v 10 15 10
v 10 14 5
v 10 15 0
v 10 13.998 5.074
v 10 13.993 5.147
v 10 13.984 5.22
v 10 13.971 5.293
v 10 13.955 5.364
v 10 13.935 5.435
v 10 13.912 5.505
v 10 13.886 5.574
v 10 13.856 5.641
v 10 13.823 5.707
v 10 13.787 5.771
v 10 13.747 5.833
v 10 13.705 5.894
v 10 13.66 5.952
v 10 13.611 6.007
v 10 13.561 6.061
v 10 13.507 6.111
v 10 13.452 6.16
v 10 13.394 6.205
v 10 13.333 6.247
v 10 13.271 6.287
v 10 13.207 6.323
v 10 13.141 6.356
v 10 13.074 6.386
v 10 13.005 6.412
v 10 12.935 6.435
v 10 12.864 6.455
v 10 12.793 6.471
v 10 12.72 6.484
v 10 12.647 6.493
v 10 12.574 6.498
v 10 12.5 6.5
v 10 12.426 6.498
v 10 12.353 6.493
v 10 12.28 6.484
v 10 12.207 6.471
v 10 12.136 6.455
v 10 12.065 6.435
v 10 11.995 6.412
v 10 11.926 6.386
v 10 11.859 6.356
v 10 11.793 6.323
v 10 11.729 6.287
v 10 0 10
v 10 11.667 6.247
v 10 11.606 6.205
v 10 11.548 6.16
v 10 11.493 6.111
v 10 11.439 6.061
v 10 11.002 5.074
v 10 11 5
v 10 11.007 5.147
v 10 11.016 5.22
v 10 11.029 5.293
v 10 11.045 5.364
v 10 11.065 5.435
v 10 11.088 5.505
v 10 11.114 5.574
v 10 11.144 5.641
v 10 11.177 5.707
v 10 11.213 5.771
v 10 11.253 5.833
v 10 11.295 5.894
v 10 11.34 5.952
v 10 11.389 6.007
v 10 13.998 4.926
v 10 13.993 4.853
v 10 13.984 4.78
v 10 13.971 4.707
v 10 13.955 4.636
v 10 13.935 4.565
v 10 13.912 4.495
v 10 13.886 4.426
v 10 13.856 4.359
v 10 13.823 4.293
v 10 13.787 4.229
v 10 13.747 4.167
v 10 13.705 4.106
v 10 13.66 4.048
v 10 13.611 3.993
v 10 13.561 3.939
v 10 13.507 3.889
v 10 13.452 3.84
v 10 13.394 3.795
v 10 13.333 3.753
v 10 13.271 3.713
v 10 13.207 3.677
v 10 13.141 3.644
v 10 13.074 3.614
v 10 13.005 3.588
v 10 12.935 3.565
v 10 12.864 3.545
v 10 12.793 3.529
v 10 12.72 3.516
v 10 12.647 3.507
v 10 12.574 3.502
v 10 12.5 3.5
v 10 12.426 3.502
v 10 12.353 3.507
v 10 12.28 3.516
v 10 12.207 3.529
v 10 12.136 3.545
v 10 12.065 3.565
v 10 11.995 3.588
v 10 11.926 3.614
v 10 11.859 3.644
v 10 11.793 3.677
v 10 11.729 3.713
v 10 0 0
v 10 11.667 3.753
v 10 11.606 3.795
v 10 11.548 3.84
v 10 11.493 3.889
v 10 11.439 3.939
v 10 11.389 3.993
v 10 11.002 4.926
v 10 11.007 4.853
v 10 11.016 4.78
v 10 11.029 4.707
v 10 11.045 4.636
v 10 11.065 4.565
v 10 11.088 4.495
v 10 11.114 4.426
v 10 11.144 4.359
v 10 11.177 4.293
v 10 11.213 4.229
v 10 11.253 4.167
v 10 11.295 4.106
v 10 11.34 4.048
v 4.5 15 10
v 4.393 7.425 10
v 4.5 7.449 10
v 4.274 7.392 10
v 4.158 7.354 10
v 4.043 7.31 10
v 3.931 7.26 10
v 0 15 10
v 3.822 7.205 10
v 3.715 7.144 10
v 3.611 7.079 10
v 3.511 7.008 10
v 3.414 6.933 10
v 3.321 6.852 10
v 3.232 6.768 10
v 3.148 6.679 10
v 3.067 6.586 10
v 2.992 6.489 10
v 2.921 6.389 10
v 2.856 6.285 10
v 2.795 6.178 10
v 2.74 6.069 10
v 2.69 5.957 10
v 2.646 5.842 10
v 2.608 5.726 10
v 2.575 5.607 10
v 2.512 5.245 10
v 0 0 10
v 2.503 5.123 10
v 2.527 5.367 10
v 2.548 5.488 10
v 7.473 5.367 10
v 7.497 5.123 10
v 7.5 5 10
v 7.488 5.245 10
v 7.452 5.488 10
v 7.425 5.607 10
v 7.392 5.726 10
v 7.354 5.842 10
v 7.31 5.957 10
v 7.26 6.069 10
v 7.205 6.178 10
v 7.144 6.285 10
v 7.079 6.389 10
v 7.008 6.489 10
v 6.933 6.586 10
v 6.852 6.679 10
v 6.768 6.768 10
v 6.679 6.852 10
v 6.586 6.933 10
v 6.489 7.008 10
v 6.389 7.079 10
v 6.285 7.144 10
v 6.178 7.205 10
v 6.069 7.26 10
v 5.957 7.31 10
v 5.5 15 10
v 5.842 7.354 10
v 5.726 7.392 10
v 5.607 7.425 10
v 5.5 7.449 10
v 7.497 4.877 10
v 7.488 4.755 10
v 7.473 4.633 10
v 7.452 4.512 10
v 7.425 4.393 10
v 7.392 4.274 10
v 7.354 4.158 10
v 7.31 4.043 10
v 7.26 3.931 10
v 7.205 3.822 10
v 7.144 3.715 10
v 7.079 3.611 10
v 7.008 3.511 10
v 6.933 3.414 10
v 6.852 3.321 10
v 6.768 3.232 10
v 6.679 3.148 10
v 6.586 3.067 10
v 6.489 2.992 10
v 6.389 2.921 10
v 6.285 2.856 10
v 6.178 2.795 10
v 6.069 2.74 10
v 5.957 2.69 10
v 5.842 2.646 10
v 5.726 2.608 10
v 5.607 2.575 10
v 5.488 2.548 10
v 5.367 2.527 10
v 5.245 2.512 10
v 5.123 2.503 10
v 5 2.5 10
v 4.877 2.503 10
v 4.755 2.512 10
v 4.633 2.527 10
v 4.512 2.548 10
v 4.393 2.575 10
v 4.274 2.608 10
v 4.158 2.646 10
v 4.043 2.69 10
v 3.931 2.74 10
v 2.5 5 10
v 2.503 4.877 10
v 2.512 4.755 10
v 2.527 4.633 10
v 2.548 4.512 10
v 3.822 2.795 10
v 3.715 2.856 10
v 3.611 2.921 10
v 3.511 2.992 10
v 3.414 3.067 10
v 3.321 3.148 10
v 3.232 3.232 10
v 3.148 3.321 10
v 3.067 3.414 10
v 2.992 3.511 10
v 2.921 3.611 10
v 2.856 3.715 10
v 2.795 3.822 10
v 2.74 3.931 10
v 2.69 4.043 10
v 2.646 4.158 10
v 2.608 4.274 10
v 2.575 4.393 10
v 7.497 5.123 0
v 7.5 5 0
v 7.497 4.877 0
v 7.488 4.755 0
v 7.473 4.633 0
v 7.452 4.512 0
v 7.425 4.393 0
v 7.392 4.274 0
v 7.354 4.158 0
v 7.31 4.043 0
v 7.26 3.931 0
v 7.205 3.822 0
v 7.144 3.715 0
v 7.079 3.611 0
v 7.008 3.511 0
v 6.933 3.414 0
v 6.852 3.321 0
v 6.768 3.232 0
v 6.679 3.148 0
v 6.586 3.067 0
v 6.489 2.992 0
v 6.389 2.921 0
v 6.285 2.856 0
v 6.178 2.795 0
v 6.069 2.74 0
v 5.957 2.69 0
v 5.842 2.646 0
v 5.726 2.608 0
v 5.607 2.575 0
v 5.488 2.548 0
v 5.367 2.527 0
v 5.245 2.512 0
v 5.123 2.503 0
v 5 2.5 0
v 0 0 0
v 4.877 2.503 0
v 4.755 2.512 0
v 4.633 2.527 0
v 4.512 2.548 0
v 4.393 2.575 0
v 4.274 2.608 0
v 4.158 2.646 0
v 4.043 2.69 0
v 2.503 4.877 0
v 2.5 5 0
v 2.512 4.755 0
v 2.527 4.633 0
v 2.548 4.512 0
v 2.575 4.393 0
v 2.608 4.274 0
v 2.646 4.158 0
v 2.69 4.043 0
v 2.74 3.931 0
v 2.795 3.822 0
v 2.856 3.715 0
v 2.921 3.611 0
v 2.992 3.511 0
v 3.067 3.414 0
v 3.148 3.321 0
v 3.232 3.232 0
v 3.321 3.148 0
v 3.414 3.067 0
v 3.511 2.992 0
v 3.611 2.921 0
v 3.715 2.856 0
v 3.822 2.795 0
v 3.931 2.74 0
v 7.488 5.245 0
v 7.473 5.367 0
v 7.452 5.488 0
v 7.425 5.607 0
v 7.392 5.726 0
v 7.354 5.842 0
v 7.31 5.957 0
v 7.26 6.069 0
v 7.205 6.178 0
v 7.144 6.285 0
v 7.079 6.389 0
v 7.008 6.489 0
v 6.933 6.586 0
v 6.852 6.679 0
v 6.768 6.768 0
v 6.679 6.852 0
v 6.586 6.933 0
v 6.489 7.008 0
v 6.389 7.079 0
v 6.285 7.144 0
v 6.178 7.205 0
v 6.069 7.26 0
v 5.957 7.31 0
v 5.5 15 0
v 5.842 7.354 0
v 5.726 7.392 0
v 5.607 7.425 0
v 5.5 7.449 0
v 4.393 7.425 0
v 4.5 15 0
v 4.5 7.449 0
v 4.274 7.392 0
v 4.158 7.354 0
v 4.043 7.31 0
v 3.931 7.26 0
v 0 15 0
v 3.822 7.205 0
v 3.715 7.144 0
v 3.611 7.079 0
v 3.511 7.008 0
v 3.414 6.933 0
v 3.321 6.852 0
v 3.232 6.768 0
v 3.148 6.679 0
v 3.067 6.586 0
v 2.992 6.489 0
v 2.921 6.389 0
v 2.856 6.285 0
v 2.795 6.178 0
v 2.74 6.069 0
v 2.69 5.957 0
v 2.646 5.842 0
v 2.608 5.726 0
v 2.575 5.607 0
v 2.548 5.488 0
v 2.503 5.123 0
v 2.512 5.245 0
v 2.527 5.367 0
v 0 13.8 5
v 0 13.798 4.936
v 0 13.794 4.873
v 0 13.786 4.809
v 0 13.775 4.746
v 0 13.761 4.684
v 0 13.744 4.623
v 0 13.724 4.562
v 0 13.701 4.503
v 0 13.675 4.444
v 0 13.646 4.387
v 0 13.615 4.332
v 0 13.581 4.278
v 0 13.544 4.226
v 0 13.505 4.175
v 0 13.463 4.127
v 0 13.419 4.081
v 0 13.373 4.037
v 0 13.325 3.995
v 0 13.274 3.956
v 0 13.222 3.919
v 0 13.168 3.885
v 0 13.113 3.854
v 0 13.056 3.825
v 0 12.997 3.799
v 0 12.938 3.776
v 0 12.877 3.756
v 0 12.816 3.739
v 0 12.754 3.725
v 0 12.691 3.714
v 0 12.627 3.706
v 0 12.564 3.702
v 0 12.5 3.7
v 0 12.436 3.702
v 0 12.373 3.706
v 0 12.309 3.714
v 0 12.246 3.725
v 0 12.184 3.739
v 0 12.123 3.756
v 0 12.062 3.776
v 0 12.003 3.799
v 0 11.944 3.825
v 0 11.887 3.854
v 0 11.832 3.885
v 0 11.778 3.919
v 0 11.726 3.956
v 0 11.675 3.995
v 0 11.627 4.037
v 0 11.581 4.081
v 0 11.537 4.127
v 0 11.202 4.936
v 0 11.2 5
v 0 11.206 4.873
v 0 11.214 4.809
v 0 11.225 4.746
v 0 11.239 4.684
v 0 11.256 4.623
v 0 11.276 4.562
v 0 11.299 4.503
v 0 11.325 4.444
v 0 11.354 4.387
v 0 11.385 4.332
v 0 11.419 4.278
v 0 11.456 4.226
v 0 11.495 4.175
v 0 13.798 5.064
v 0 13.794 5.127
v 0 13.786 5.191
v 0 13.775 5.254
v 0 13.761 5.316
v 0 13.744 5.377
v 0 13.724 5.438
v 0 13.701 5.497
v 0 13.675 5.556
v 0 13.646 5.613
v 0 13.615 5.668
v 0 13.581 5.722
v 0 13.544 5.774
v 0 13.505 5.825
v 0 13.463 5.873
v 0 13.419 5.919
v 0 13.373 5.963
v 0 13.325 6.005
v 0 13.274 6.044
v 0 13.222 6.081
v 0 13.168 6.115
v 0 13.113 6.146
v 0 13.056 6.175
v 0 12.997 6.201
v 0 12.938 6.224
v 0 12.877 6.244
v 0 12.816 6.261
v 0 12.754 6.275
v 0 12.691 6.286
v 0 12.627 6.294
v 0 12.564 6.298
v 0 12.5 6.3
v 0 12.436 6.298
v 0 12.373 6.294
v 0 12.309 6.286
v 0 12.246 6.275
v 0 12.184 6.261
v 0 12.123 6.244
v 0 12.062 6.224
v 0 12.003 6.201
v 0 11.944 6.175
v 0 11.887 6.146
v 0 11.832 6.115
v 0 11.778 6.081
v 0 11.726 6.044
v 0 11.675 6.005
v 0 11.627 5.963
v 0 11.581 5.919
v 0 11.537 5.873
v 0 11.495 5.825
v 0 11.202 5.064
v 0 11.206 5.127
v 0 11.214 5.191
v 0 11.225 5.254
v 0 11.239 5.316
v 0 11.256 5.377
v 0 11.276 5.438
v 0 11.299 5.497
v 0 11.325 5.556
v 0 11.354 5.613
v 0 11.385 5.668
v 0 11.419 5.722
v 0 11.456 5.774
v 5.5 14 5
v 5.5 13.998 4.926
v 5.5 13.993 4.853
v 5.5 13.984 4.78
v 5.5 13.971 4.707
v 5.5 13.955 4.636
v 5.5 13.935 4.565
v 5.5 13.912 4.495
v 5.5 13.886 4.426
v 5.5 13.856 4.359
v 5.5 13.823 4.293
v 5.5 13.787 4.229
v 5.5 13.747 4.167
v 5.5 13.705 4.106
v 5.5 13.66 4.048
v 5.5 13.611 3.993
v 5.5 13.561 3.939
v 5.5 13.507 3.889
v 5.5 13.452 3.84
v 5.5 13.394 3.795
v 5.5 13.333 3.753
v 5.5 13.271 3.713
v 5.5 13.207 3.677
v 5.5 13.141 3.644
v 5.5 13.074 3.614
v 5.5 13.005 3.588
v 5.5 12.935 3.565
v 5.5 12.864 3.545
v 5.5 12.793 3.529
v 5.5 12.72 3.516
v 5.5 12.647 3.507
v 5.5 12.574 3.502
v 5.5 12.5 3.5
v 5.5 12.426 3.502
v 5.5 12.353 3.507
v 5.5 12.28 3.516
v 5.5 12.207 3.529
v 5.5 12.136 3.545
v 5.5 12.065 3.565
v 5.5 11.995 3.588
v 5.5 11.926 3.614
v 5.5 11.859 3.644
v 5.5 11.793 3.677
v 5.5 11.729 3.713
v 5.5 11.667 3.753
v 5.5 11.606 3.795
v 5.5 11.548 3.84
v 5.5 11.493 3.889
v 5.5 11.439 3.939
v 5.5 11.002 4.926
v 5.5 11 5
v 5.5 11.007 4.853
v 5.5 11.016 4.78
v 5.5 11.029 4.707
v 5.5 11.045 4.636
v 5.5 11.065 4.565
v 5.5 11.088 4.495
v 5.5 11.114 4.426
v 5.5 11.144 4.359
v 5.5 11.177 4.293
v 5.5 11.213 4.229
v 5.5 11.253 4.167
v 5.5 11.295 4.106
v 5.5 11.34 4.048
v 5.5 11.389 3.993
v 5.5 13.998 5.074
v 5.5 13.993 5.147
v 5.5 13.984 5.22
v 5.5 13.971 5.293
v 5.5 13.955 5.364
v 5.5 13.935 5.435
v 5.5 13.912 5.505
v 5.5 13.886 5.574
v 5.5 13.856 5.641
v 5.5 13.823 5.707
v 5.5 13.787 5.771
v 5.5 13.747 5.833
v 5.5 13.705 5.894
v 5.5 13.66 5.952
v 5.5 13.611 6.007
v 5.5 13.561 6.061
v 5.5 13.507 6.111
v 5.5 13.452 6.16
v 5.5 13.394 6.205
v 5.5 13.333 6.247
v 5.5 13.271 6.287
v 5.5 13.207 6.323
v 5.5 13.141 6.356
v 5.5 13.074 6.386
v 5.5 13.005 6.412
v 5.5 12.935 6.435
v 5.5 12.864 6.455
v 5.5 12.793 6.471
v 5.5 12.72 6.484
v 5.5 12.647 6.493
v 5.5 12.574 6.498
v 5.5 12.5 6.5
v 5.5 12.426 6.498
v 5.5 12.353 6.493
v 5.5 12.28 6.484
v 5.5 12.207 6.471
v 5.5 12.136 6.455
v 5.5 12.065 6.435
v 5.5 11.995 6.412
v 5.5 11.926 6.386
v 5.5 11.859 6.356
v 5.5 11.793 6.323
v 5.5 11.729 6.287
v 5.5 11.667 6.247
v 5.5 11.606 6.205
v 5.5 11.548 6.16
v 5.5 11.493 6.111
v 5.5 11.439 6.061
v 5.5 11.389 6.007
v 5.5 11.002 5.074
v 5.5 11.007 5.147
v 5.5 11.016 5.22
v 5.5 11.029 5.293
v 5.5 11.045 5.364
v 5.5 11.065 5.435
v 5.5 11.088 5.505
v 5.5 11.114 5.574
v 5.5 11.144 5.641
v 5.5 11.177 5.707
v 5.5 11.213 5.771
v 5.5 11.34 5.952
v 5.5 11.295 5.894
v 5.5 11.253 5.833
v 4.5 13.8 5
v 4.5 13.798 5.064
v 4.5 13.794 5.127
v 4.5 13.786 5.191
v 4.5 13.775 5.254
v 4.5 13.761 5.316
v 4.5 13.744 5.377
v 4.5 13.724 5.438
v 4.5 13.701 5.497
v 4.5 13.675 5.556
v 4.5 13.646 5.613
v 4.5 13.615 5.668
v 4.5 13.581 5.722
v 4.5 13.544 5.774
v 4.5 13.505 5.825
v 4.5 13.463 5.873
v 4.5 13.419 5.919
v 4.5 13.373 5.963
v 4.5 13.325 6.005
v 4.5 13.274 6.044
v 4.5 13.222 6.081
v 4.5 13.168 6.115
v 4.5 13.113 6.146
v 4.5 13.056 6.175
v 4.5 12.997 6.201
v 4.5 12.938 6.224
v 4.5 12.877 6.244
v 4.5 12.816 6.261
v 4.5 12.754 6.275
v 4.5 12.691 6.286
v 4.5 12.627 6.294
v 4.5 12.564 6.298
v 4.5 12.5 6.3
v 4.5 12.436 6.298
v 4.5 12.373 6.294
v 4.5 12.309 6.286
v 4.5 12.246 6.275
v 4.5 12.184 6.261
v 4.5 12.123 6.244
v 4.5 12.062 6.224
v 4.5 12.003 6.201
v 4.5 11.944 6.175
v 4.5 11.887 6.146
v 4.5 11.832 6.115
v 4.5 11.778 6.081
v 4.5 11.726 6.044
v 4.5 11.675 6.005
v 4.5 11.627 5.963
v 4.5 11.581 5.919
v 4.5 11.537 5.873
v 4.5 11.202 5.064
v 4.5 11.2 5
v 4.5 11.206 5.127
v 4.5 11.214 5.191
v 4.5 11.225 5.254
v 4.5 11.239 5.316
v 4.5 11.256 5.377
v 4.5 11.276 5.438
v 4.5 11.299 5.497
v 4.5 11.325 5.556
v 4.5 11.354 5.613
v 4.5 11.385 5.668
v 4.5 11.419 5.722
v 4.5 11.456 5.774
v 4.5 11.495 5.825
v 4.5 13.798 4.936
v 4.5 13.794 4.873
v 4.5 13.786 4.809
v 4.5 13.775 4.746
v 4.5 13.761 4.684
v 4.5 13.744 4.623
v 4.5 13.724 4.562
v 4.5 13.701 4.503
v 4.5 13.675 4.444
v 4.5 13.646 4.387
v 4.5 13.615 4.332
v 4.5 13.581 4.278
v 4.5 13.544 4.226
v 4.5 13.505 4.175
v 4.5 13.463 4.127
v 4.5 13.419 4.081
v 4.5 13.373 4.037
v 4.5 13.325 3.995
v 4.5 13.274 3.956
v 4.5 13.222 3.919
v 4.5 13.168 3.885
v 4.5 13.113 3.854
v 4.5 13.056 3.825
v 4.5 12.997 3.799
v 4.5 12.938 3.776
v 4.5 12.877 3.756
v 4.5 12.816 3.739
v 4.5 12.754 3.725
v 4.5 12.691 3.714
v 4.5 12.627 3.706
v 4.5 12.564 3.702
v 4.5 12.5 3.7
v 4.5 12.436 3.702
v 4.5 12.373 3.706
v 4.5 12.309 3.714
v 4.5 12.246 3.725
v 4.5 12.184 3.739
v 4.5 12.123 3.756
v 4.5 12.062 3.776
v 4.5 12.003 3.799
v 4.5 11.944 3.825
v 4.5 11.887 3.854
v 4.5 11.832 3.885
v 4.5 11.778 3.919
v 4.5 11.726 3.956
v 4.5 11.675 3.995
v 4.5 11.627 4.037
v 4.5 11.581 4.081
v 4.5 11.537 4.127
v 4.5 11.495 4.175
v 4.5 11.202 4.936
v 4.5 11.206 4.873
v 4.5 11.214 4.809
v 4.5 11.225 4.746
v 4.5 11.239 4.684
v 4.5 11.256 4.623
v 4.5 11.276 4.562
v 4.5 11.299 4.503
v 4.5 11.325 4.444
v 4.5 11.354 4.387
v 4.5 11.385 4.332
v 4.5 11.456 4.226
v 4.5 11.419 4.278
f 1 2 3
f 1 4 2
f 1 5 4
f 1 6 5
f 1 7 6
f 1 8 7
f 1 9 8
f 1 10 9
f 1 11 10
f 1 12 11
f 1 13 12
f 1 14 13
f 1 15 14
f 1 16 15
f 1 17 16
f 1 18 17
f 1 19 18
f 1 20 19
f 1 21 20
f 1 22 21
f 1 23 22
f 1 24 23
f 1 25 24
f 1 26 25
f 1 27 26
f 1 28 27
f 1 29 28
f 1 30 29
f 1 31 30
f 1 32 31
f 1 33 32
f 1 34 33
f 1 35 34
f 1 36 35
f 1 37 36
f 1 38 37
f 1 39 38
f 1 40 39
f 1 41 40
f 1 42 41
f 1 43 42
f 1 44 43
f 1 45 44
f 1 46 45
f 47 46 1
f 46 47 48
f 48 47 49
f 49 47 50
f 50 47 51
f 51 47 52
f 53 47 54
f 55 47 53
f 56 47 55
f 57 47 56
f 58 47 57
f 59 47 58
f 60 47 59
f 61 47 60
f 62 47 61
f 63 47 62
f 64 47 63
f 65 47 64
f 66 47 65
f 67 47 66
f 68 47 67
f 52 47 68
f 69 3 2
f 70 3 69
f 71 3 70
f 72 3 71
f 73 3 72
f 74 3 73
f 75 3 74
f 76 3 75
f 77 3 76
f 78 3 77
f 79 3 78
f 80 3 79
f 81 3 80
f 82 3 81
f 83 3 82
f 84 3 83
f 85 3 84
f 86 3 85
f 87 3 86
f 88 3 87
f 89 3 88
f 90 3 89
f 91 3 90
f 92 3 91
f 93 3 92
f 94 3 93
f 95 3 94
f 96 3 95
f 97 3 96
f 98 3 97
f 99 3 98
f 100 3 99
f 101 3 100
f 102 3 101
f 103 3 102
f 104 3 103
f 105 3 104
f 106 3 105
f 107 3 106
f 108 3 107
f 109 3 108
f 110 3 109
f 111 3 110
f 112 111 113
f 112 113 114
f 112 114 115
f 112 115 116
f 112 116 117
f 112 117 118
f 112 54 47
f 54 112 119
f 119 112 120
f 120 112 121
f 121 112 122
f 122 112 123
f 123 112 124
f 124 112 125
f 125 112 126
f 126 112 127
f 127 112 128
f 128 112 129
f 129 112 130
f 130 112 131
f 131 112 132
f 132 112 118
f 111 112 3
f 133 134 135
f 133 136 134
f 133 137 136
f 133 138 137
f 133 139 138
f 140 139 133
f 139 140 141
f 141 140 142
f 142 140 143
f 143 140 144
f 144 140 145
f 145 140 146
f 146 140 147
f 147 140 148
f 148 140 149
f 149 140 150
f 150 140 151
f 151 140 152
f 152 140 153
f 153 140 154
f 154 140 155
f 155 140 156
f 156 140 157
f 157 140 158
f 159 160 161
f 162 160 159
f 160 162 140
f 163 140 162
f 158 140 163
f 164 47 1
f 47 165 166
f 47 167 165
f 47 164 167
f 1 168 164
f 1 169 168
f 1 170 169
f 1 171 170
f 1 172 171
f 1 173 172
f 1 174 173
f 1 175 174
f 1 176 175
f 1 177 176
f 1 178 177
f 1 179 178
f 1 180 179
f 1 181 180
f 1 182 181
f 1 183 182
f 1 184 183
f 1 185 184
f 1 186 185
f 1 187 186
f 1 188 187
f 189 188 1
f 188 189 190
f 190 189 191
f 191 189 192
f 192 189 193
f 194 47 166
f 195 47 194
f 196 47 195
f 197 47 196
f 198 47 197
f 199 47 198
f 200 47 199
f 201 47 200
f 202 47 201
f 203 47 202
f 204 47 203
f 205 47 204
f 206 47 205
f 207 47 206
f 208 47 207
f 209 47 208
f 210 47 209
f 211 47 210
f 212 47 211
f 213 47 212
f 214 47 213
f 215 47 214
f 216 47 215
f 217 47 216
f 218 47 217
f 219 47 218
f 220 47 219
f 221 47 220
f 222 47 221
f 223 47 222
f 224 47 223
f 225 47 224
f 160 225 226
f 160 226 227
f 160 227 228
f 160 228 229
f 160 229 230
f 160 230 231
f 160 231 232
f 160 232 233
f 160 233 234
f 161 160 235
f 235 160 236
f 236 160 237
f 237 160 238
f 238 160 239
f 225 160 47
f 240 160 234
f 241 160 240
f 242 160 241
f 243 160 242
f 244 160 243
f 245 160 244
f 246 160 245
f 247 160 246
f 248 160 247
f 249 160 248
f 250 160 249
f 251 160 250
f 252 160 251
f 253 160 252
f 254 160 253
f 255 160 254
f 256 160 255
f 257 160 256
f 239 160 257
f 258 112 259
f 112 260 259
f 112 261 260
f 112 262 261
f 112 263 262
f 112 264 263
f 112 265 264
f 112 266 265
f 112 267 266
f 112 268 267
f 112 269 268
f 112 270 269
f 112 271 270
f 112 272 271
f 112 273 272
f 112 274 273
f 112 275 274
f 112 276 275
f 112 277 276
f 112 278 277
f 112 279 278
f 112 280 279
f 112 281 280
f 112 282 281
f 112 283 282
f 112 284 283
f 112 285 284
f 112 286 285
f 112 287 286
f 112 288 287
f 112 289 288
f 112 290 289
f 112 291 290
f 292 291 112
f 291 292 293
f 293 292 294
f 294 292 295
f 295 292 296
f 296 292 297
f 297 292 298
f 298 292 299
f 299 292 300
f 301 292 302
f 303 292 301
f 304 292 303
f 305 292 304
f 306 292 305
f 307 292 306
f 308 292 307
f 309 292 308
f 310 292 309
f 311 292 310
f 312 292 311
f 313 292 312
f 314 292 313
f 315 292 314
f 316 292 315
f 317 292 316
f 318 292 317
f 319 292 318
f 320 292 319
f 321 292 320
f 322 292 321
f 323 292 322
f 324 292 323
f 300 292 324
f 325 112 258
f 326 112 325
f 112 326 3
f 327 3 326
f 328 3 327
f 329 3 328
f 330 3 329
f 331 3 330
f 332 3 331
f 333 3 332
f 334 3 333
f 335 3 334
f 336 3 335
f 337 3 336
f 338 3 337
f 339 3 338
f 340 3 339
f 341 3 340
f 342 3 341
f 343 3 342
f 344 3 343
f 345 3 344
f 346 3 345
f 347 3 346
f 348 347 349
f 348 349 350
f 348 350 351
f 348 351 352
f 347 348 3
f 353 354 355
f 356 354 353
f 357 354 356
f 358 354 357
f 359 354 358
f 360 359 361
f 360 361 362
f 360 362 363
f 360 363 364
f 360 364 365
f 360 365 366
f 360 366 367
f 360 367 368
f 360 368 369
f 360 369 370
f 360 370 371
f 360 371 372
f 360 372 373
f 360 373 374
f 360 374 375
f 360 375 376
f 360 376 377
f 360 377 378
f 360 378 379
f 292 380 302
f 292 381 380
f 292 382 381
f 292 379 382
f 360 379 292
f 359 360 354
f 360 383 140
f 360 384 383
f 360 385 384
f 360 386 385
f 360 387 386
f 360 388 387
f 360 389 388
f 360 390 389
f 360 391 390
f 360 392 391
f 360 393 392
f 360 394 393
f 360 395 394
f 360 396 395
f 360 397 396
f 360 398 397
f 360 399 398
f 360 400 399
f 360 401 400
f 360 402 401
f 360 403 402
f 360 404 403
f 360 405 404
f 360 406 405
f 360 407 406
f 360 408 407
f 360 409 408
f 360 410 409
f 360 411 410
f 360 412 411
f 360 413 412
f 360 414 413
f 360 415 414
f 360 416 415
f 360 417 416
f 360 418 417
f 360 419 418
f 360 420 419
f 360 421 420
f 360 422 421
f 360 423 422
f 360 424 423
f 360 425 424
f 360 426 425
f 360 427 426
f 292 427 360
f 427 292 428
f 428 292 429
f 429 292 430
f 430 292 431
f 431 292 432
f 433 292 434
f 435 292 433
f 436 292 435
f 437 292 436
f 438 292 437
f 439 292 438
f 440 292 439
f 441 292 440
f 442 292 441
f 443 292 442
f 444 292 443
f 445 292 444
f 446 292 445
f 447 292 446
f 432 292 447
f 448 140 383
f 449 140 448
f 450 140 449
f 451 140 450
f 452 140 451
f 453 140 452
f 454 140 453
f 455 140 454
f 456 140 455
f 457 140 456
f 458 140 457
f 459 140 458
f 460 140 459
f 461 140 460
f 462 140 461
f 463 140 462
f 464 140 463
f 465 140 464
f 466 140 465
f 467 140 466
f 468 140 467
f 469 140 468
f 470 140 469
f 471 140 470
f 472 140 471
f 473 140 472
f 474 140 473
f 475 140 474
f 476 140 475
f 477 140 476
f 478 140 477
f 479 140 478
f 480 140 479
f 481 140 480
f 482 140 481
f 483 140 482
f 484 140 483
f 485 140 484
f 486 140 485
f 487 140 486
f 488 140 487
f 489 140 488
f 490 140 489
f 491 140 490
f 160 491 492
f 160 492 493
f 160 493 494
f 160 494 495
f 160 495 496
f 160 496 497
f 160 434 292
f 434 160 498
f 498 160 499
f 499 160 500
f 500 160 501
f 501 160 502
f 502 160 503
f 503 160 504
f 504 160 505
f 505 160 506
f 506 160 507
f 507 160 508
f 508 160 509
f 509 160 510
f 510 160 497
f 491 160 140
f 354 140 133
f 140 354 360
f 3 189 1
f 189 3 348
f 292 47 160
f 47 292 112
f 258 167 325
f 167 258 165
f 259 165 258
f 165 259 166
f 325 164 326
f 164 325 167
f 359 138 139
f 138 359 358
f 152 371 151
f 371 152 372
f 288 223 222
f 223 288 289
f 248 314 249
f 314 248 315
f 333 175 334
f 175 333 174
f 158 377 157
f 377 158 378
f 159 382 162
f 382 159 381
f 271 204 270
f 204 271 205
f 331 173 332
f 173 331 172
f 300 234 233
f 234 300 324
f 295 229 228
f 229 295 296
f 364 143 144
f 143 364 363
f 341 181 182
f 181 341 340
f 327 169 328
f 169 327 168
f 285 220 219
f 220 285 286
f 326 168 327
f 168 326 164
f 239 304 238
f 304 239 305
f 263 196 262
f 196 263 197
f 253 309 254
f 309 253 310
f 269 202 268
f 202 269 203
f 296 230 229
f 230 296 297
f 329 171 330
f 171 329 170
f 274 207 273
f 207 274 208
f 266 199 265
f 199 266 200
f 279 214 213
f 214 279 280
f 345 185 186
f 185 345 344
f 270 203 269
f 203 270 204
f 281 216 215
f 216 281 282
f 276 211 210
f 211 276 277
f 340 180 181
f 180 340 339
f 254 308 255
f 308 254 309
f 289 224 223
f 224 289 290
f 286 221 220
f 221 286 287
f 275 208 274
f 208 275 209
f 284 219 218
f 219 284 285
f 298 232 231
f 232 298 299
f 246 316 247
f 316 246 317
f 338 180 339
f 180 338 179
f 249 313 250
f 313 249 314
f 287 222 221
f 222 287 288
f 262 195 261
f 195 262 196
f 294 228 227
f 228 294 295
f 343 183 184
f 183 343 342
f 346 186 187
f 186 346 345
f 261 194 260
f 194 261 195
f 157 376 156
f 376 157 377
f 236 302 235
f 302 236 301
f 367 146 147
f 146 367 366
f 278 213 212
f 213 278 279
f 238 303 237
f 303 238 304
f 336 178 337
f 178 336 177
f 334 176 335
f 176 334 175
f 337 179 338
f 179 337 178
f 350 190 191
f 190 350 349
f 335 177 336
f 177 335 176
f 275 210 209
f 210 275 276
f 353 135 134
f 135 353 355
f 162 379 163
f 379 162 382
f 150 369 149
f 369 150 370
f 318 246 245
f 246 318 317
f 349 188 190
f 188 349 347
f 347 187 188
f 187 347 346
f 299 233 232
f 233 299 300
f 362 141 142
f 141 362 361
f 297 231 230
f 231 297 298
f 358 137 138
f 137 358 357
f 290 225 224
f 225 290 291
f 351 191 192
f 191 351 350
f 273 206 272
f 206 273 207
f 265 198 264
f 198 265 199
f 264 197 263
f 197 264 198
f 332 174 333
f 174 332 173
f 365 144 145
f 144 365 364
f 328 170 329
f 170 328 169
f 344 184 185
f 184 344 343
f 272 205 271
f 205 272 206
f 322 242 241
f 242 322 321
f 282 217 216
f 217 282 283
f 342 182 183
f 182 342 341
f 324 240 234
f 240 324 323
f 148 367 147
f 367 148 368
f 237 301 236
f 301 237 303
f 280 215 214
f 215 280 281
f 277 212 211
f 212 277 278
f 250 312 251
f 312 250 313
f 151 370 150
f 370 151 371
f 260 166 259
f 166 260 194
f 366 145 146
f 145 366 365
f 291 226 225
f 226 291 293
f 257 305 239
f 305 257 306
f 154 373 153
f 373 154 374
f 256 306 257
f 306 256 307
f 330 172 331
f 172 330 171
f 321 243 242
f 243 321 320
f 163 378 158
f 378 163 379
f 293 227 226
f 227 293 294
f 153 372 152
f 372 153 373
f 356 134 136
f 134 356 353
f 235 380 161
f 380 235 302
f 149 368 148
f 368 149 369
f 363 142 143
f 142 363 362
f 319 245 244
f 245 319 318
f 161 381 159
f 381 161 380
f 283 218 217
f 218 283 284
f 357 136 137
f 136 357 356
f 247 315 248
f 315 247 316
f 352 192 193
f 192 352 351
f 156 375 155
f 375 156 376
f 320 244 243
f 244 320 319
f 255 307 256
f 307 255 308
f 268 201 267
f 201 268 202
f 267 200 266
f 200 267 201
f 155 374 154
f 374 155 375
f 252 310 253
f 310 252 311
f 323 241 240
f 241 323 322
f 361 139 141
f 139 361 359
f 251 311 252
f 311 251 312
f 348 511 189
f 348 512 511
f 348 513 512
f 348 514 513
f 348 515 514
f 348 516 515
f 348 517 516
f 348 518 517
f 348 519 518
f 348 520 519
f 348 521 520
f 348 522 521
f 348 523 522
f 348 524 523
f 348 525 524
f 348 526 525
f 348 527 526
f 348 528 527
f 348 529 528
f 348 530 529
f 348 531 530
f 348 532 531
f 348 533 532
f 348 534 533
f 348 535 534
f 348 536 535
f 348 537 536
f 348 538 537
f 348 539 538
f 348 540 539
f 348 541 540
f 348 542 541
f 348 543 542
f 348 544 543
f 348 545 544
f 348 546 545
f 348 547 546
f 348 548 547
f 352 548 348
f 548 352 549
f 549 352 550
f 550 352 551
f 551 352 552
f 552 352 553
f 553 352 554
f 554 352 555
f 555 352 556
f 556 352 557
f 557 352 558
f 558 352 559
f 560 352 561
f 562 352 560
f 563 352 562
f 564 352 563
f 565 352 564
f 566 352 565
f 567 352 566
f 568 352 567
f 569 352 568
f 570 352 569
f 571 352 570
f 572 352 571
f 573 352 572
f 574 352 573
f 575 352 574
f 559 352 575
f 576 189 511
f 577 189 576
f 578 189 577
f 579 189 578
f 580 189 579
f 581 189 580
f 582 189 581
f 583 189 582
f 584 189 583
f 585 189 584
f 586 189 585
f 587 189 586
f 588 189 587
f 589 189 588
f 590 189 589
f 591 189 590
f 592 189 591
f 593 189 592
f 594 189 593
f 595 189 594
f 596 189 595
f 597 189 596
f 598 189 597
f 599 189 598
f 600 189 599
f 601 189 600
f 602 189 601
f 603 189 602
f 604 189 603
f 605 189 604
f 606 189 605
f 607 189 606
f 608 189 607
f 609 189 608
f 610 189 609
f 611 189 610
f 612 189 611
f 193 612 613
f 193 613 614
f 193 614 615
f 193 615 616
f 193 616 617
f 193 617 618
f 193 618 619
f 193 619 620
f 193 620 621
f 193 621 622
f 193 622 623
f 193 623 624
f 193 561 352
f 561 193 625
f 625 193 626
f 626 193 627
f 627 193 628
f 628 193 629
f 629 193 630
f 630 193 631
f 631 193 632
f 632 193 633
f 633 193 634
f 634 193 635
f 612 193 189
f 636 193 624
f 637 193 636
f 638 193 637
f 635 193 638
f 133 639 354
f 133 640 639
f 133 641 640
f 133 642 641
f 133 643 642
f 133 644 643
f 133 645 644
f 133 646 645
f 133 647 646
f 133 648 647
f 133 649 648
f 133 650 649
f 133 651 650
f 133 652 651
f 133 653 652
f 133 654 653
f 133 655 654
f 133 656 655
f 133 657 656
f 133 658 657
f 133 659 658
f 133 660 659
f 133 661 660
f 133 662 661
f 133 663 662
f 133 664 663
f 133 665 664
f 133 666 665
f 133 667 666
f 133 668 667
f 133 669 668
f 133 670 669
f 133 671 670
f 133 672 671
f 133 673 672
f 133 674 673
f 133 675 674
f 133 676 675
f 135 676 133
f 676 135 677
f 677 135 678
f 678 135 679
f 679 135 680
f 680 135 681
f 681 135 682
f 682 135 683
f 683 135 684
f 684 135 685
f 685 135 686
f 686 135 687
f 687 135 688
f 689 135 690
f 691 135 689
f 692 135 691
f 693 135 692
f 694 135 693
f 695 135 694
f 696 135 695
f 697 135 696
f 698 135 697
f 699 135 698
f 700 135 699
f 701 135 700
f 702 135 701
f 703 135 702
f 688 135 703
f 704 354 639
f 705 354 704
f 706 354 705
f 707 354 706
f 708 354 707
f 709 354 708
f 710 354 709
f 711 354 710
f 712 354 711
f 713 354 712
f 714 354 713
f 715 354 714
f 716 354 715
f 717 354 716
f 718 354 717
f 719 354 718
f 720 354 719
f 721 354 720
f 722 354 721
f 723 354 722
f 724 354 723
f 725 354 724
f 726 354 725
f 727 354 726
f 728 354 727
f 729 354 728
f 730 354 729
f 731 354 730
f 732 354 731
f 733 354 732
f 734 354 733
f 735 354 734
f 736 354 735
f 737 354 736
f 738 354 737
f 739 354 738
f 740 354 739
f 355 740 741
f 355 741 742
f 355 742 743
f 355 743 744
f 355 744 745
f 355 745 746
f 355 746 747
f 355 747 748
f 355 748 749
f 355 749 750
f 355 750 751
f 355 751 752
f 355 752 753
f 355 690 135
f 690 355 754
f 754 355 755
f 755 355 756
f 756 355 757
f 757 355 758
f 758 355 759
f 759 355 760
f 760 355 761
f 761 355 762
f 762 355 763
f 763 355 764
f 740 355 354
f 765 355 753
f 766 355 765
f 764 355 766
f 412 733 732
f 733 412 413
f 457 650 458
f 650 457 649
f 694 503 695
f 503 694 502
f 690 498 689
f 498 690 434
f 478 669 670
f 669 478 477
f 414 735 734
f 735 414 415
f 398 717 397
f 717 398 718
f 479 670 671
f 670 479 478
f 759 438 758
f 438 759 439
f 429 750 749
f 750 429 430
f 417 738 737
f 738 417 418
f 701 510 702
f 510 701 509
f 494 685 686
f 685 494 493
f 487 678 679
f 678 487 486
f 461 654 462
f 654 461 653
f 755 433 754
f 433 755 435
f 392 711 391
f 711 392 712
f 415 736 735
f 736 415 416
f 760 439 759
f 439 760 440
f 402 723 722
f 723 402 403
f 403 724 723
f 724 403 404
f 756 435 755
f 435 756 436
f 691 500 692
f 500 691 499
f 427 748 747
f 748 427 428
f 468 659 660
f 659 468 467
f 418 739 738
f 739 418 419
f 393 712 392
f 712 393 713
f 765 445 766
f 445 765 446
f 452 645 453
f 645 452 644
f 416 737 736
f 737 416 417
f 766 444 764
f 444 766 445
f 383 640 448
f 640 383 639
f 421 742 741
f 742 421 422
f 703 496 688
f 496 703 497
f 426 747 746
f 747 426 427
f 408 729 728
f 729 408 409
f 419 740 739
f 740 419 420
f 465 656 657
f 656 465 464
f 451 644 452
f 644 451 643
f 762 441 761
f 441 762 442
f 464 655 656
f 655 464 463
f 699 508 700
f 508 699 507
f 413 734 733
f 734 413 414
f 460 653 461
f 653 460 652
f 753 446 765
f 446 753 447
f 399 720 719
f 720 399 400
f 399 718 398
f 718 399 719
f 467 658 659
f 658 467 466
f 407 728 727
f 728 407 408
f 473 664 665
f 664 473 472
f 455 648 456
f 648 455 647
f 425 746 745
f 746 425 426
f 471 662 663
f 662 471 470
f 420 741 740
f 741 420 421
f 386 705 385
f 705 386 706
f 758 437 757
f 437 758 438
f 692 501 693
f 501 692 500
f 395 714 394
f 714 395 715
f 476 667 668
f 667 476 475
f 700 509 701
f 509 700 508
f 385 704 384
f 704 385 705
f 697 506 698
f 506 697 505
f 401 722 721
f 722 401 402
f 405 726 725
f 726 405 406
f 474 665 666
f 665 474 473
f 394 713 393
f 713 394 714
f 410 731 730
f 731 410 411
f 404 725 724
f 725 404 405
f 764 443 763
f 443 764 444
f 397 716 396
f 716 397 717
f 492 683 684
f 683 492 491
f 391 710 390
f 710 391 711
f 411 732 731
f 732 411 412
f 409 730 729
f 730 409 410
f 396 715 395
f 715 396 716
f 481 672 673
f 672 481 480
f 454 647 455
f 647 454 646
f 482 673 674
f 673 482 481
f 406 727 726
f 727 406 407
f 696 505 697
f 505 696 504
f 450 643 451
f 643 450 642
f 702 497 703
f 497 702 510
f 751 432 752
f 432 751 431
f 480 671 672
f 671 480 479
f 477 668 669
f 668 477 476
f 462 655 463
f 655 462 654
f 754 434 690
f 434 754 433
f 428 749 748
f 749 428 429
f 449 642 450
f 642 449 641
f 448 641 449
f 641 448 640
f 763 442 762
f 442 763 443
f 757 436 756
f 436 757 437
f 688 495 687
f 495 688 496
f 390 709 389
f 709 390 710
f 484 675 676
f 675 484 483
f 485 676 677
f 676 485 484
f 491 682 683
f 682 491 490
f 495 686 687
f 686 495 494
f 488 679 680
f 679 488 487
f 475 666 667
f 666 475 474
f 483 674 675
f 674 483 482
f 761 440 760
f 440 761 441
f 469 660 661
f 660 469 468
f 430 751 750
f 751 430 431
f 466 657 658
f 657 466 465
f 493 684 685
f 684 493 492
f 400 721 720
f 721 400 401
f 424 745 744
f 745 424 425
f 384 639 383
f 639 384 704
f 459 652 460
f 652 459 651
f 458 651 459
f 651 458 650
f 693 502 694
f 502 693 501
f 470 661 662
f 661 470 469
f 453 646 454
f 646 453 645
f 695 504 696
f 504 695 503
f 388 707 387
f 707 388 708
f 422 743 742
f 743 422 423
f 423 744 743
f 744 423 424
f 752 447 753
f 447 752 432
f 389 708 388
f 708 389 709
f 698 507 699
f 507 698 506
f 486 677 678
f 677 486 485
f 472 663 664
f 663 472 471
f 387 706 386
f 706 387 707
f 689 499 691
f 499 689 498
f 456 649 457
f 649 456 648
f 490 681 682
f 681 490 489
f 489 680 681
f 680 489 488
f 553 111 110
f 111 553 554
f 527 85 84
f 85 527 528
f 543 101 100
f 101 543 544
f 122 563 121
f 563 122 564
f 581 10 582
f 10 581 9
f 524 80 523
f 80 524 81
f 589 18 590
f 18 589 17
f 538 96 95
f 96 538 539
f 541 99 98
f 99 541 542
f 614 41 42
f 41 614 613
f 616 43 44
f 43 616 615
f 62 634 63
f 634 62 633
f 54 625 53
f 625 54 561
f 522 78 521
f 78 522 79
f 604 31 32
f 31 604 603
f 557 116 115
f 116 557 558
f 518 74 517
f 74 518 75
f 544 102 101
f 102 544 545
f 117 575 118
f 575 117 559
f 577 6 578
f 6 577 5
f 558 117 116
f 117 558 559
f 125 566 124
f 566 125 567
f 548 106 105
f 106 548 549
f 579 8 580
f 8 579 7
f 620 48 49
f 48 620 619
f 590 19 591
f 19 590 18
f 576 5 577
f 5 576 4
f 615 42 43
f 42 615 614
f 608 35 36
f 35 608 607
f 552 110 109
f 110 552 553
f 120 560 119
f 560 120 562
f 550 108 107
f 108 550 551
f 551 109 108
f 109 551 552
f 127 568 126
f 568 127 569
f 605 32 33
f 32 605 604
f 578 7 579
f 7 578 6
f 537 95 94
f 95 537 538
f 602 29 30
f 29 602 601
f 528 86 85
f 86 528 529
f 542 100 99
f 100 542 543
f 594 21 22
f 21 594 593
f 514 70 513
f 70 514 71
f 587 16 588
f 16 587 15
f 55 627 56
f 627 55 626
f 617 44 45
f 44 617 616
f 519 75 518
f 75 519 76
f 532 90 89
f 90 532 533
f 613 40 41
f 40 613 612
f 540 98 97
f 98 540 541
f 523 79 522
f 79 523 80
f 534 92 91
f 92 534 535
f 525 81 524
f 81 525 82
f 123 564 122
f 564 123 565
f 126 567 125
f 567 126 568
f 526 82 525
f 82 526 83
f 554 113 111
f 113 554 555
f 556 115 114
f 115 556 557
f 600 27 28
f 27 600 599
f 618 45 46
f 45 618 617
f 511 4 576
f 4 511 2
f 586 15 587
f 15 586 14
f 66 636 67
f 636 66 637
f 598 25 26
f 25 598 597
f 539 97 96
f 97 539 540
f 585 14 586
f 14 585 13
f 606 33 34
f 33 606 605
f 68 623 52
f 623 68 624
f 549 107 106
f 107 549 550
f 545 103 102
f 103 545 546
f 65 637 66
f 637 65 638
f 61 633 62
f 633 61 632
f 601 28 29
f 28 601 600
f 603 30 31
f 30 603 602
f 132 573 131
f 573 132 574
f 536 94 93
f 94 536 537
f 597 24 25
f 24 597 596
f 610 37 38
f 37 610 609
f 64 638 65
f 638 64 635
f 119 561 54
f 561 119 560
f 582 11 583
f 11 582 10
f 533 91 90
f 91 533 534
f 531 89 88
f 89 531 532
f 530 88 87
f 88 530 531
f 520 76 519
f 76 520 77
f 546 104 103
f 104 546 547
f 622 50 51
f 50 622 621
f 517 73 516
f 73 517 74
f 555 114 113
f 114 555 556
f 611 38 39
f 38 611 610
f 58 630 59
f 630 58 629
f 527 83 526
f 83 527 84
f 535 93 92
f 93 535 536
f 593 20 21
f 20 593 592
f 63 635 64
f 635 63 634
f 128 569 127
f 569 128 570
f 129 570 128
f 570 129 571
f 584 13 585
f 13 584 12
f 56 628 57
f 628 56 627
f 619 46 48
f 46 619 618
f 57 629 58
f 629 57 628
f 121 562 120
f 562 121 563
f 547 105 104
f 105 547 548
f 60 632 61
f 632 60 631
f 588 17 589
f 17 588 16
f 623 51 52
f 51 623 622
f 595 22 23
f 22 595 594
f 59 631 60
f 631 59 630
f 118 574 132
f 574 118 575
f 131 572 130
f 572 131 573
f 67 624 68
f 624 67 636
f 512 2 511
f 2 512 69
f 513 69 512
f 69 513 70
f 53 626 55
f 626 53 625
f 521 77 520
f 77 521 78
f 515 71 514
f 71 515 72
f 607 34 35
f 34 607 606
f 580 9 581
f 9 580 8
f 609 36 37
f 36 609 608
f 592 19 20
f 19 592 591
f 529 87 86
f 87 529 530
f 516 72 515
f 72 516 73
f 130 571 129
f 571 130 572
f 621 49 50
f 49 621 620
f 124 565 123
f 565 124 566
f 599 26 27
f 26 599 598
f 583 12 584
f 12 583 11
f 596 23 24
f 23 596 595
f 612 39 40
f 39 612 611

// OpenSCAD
// file: common.scad
eps = 0.01;
$fn= $preview ? 32 : 128;

x_carriage_width = 65;
y_carriage_depth = 50;

x_rod_spacing = 30;
x_rod_height = 40;
y_rod_spacing = 30;
y_rod_height = 48;

lin_bearing_OD_measured = 9.97;
lin_bearing_OD = lin_bearing_OD_measured + 0.2; // needs more clearance when 3D printing in XY plane
lin_bearing_length = 14.95;

rod_OD = 4.98;
rod_clr = 1;
rod_pressfit_horiz = 5.0; // a bit tight, but a little filing makes a good snug fit
x_rod_length = 215;
y_rod_length = 215;

M3_self_thread = 3.0; // for vertical (along 3D printer Z axis) holes only.
M3_pass_through = 3.2; // for vertical holes only
M3_self_thread_horiz = 2.6; // for horizontal (along 3D printer XY plane) holes only.
M3_pass_through_horiz = 3.0; // for horizontal holes only

pulley_deck_height = 54;

pen_lifter_bolt_pattern_diameter = 25;

// LIN Engineering stepper 4118M-39D-01
stepper_bolt_pattern_diameter = 43.51;
stepper_axle_diameter = 4.98;
stepper_axle_length = 22;
stepper_body_width = 42.5;
stepper_body_depth = 42.5;
stepper_body_height = 39.6;
stepper_boss_diameter = 22;
stepper_boss_height = 2;
stepper_rear_axle_length = 8.5;

pulley_diameter = 11.81; // the effective diameter of the pulley. from highest points on teeth across (from a printed 20T pulley)
belt_thickness = 1.06; // the thickness of the belt, not including the teeth
// the belt wrapped around the pulley is 14.17mm in diameter
// larger than the 13.93 you'd expect from belt_thickness * 2 + pulley_diameter

inner_idler_spacing = 2*(pulley_diameter + belt_thickness); // the distance between the two inner idlers on the x carriage
outer_idler_spacing = 4*(pulley_diameter + belt_thickness); // the distance between the two outer idlers on the x carriage
outer_idler_offset = pulley_diameter; // how far forward the outer idlers are offset from the center line of the x axis
// main file
// this can be used to clamp on to the y or x axis rods
// in order to improve tension in the belt

include <common.scad>;

width = 10;
height = 15;
thickness = 10;

rod_offset = 5;
screw_offset = 2.5;
slot_thickeness = 1;

module rod_clamp() {
  difference() {
    // the body
    cube([width, height, thickness]);
    // the rod pass through
    translate([width/2, rod_offset, -eps])
      cylinder(h=thickness+2*eps, d=rod_pressfit_horiz);
    // the slot
    translate([width/2-slot_thickeness/2, rod_offset, -eps])
      cube([slot_thickeness, height-rod_offset+eps, thickness+2*eps]);
    // clamp screw, threaded side
    translate([-width/2, height-screw_offset, thickness/2])
      rotate([0, 90, 0])
      cylinder(h=width+2*eps, d=M3_self_thread_horiz);
    // clamp screw, unthreaded side
    translate([width/2, height-screw_offset, thickness/2])
      rotate([0, 90, 0])
      cylinder(h=width+2*eps, d=M3_pass_through_horiz);
  }
}

rod_clamp();
